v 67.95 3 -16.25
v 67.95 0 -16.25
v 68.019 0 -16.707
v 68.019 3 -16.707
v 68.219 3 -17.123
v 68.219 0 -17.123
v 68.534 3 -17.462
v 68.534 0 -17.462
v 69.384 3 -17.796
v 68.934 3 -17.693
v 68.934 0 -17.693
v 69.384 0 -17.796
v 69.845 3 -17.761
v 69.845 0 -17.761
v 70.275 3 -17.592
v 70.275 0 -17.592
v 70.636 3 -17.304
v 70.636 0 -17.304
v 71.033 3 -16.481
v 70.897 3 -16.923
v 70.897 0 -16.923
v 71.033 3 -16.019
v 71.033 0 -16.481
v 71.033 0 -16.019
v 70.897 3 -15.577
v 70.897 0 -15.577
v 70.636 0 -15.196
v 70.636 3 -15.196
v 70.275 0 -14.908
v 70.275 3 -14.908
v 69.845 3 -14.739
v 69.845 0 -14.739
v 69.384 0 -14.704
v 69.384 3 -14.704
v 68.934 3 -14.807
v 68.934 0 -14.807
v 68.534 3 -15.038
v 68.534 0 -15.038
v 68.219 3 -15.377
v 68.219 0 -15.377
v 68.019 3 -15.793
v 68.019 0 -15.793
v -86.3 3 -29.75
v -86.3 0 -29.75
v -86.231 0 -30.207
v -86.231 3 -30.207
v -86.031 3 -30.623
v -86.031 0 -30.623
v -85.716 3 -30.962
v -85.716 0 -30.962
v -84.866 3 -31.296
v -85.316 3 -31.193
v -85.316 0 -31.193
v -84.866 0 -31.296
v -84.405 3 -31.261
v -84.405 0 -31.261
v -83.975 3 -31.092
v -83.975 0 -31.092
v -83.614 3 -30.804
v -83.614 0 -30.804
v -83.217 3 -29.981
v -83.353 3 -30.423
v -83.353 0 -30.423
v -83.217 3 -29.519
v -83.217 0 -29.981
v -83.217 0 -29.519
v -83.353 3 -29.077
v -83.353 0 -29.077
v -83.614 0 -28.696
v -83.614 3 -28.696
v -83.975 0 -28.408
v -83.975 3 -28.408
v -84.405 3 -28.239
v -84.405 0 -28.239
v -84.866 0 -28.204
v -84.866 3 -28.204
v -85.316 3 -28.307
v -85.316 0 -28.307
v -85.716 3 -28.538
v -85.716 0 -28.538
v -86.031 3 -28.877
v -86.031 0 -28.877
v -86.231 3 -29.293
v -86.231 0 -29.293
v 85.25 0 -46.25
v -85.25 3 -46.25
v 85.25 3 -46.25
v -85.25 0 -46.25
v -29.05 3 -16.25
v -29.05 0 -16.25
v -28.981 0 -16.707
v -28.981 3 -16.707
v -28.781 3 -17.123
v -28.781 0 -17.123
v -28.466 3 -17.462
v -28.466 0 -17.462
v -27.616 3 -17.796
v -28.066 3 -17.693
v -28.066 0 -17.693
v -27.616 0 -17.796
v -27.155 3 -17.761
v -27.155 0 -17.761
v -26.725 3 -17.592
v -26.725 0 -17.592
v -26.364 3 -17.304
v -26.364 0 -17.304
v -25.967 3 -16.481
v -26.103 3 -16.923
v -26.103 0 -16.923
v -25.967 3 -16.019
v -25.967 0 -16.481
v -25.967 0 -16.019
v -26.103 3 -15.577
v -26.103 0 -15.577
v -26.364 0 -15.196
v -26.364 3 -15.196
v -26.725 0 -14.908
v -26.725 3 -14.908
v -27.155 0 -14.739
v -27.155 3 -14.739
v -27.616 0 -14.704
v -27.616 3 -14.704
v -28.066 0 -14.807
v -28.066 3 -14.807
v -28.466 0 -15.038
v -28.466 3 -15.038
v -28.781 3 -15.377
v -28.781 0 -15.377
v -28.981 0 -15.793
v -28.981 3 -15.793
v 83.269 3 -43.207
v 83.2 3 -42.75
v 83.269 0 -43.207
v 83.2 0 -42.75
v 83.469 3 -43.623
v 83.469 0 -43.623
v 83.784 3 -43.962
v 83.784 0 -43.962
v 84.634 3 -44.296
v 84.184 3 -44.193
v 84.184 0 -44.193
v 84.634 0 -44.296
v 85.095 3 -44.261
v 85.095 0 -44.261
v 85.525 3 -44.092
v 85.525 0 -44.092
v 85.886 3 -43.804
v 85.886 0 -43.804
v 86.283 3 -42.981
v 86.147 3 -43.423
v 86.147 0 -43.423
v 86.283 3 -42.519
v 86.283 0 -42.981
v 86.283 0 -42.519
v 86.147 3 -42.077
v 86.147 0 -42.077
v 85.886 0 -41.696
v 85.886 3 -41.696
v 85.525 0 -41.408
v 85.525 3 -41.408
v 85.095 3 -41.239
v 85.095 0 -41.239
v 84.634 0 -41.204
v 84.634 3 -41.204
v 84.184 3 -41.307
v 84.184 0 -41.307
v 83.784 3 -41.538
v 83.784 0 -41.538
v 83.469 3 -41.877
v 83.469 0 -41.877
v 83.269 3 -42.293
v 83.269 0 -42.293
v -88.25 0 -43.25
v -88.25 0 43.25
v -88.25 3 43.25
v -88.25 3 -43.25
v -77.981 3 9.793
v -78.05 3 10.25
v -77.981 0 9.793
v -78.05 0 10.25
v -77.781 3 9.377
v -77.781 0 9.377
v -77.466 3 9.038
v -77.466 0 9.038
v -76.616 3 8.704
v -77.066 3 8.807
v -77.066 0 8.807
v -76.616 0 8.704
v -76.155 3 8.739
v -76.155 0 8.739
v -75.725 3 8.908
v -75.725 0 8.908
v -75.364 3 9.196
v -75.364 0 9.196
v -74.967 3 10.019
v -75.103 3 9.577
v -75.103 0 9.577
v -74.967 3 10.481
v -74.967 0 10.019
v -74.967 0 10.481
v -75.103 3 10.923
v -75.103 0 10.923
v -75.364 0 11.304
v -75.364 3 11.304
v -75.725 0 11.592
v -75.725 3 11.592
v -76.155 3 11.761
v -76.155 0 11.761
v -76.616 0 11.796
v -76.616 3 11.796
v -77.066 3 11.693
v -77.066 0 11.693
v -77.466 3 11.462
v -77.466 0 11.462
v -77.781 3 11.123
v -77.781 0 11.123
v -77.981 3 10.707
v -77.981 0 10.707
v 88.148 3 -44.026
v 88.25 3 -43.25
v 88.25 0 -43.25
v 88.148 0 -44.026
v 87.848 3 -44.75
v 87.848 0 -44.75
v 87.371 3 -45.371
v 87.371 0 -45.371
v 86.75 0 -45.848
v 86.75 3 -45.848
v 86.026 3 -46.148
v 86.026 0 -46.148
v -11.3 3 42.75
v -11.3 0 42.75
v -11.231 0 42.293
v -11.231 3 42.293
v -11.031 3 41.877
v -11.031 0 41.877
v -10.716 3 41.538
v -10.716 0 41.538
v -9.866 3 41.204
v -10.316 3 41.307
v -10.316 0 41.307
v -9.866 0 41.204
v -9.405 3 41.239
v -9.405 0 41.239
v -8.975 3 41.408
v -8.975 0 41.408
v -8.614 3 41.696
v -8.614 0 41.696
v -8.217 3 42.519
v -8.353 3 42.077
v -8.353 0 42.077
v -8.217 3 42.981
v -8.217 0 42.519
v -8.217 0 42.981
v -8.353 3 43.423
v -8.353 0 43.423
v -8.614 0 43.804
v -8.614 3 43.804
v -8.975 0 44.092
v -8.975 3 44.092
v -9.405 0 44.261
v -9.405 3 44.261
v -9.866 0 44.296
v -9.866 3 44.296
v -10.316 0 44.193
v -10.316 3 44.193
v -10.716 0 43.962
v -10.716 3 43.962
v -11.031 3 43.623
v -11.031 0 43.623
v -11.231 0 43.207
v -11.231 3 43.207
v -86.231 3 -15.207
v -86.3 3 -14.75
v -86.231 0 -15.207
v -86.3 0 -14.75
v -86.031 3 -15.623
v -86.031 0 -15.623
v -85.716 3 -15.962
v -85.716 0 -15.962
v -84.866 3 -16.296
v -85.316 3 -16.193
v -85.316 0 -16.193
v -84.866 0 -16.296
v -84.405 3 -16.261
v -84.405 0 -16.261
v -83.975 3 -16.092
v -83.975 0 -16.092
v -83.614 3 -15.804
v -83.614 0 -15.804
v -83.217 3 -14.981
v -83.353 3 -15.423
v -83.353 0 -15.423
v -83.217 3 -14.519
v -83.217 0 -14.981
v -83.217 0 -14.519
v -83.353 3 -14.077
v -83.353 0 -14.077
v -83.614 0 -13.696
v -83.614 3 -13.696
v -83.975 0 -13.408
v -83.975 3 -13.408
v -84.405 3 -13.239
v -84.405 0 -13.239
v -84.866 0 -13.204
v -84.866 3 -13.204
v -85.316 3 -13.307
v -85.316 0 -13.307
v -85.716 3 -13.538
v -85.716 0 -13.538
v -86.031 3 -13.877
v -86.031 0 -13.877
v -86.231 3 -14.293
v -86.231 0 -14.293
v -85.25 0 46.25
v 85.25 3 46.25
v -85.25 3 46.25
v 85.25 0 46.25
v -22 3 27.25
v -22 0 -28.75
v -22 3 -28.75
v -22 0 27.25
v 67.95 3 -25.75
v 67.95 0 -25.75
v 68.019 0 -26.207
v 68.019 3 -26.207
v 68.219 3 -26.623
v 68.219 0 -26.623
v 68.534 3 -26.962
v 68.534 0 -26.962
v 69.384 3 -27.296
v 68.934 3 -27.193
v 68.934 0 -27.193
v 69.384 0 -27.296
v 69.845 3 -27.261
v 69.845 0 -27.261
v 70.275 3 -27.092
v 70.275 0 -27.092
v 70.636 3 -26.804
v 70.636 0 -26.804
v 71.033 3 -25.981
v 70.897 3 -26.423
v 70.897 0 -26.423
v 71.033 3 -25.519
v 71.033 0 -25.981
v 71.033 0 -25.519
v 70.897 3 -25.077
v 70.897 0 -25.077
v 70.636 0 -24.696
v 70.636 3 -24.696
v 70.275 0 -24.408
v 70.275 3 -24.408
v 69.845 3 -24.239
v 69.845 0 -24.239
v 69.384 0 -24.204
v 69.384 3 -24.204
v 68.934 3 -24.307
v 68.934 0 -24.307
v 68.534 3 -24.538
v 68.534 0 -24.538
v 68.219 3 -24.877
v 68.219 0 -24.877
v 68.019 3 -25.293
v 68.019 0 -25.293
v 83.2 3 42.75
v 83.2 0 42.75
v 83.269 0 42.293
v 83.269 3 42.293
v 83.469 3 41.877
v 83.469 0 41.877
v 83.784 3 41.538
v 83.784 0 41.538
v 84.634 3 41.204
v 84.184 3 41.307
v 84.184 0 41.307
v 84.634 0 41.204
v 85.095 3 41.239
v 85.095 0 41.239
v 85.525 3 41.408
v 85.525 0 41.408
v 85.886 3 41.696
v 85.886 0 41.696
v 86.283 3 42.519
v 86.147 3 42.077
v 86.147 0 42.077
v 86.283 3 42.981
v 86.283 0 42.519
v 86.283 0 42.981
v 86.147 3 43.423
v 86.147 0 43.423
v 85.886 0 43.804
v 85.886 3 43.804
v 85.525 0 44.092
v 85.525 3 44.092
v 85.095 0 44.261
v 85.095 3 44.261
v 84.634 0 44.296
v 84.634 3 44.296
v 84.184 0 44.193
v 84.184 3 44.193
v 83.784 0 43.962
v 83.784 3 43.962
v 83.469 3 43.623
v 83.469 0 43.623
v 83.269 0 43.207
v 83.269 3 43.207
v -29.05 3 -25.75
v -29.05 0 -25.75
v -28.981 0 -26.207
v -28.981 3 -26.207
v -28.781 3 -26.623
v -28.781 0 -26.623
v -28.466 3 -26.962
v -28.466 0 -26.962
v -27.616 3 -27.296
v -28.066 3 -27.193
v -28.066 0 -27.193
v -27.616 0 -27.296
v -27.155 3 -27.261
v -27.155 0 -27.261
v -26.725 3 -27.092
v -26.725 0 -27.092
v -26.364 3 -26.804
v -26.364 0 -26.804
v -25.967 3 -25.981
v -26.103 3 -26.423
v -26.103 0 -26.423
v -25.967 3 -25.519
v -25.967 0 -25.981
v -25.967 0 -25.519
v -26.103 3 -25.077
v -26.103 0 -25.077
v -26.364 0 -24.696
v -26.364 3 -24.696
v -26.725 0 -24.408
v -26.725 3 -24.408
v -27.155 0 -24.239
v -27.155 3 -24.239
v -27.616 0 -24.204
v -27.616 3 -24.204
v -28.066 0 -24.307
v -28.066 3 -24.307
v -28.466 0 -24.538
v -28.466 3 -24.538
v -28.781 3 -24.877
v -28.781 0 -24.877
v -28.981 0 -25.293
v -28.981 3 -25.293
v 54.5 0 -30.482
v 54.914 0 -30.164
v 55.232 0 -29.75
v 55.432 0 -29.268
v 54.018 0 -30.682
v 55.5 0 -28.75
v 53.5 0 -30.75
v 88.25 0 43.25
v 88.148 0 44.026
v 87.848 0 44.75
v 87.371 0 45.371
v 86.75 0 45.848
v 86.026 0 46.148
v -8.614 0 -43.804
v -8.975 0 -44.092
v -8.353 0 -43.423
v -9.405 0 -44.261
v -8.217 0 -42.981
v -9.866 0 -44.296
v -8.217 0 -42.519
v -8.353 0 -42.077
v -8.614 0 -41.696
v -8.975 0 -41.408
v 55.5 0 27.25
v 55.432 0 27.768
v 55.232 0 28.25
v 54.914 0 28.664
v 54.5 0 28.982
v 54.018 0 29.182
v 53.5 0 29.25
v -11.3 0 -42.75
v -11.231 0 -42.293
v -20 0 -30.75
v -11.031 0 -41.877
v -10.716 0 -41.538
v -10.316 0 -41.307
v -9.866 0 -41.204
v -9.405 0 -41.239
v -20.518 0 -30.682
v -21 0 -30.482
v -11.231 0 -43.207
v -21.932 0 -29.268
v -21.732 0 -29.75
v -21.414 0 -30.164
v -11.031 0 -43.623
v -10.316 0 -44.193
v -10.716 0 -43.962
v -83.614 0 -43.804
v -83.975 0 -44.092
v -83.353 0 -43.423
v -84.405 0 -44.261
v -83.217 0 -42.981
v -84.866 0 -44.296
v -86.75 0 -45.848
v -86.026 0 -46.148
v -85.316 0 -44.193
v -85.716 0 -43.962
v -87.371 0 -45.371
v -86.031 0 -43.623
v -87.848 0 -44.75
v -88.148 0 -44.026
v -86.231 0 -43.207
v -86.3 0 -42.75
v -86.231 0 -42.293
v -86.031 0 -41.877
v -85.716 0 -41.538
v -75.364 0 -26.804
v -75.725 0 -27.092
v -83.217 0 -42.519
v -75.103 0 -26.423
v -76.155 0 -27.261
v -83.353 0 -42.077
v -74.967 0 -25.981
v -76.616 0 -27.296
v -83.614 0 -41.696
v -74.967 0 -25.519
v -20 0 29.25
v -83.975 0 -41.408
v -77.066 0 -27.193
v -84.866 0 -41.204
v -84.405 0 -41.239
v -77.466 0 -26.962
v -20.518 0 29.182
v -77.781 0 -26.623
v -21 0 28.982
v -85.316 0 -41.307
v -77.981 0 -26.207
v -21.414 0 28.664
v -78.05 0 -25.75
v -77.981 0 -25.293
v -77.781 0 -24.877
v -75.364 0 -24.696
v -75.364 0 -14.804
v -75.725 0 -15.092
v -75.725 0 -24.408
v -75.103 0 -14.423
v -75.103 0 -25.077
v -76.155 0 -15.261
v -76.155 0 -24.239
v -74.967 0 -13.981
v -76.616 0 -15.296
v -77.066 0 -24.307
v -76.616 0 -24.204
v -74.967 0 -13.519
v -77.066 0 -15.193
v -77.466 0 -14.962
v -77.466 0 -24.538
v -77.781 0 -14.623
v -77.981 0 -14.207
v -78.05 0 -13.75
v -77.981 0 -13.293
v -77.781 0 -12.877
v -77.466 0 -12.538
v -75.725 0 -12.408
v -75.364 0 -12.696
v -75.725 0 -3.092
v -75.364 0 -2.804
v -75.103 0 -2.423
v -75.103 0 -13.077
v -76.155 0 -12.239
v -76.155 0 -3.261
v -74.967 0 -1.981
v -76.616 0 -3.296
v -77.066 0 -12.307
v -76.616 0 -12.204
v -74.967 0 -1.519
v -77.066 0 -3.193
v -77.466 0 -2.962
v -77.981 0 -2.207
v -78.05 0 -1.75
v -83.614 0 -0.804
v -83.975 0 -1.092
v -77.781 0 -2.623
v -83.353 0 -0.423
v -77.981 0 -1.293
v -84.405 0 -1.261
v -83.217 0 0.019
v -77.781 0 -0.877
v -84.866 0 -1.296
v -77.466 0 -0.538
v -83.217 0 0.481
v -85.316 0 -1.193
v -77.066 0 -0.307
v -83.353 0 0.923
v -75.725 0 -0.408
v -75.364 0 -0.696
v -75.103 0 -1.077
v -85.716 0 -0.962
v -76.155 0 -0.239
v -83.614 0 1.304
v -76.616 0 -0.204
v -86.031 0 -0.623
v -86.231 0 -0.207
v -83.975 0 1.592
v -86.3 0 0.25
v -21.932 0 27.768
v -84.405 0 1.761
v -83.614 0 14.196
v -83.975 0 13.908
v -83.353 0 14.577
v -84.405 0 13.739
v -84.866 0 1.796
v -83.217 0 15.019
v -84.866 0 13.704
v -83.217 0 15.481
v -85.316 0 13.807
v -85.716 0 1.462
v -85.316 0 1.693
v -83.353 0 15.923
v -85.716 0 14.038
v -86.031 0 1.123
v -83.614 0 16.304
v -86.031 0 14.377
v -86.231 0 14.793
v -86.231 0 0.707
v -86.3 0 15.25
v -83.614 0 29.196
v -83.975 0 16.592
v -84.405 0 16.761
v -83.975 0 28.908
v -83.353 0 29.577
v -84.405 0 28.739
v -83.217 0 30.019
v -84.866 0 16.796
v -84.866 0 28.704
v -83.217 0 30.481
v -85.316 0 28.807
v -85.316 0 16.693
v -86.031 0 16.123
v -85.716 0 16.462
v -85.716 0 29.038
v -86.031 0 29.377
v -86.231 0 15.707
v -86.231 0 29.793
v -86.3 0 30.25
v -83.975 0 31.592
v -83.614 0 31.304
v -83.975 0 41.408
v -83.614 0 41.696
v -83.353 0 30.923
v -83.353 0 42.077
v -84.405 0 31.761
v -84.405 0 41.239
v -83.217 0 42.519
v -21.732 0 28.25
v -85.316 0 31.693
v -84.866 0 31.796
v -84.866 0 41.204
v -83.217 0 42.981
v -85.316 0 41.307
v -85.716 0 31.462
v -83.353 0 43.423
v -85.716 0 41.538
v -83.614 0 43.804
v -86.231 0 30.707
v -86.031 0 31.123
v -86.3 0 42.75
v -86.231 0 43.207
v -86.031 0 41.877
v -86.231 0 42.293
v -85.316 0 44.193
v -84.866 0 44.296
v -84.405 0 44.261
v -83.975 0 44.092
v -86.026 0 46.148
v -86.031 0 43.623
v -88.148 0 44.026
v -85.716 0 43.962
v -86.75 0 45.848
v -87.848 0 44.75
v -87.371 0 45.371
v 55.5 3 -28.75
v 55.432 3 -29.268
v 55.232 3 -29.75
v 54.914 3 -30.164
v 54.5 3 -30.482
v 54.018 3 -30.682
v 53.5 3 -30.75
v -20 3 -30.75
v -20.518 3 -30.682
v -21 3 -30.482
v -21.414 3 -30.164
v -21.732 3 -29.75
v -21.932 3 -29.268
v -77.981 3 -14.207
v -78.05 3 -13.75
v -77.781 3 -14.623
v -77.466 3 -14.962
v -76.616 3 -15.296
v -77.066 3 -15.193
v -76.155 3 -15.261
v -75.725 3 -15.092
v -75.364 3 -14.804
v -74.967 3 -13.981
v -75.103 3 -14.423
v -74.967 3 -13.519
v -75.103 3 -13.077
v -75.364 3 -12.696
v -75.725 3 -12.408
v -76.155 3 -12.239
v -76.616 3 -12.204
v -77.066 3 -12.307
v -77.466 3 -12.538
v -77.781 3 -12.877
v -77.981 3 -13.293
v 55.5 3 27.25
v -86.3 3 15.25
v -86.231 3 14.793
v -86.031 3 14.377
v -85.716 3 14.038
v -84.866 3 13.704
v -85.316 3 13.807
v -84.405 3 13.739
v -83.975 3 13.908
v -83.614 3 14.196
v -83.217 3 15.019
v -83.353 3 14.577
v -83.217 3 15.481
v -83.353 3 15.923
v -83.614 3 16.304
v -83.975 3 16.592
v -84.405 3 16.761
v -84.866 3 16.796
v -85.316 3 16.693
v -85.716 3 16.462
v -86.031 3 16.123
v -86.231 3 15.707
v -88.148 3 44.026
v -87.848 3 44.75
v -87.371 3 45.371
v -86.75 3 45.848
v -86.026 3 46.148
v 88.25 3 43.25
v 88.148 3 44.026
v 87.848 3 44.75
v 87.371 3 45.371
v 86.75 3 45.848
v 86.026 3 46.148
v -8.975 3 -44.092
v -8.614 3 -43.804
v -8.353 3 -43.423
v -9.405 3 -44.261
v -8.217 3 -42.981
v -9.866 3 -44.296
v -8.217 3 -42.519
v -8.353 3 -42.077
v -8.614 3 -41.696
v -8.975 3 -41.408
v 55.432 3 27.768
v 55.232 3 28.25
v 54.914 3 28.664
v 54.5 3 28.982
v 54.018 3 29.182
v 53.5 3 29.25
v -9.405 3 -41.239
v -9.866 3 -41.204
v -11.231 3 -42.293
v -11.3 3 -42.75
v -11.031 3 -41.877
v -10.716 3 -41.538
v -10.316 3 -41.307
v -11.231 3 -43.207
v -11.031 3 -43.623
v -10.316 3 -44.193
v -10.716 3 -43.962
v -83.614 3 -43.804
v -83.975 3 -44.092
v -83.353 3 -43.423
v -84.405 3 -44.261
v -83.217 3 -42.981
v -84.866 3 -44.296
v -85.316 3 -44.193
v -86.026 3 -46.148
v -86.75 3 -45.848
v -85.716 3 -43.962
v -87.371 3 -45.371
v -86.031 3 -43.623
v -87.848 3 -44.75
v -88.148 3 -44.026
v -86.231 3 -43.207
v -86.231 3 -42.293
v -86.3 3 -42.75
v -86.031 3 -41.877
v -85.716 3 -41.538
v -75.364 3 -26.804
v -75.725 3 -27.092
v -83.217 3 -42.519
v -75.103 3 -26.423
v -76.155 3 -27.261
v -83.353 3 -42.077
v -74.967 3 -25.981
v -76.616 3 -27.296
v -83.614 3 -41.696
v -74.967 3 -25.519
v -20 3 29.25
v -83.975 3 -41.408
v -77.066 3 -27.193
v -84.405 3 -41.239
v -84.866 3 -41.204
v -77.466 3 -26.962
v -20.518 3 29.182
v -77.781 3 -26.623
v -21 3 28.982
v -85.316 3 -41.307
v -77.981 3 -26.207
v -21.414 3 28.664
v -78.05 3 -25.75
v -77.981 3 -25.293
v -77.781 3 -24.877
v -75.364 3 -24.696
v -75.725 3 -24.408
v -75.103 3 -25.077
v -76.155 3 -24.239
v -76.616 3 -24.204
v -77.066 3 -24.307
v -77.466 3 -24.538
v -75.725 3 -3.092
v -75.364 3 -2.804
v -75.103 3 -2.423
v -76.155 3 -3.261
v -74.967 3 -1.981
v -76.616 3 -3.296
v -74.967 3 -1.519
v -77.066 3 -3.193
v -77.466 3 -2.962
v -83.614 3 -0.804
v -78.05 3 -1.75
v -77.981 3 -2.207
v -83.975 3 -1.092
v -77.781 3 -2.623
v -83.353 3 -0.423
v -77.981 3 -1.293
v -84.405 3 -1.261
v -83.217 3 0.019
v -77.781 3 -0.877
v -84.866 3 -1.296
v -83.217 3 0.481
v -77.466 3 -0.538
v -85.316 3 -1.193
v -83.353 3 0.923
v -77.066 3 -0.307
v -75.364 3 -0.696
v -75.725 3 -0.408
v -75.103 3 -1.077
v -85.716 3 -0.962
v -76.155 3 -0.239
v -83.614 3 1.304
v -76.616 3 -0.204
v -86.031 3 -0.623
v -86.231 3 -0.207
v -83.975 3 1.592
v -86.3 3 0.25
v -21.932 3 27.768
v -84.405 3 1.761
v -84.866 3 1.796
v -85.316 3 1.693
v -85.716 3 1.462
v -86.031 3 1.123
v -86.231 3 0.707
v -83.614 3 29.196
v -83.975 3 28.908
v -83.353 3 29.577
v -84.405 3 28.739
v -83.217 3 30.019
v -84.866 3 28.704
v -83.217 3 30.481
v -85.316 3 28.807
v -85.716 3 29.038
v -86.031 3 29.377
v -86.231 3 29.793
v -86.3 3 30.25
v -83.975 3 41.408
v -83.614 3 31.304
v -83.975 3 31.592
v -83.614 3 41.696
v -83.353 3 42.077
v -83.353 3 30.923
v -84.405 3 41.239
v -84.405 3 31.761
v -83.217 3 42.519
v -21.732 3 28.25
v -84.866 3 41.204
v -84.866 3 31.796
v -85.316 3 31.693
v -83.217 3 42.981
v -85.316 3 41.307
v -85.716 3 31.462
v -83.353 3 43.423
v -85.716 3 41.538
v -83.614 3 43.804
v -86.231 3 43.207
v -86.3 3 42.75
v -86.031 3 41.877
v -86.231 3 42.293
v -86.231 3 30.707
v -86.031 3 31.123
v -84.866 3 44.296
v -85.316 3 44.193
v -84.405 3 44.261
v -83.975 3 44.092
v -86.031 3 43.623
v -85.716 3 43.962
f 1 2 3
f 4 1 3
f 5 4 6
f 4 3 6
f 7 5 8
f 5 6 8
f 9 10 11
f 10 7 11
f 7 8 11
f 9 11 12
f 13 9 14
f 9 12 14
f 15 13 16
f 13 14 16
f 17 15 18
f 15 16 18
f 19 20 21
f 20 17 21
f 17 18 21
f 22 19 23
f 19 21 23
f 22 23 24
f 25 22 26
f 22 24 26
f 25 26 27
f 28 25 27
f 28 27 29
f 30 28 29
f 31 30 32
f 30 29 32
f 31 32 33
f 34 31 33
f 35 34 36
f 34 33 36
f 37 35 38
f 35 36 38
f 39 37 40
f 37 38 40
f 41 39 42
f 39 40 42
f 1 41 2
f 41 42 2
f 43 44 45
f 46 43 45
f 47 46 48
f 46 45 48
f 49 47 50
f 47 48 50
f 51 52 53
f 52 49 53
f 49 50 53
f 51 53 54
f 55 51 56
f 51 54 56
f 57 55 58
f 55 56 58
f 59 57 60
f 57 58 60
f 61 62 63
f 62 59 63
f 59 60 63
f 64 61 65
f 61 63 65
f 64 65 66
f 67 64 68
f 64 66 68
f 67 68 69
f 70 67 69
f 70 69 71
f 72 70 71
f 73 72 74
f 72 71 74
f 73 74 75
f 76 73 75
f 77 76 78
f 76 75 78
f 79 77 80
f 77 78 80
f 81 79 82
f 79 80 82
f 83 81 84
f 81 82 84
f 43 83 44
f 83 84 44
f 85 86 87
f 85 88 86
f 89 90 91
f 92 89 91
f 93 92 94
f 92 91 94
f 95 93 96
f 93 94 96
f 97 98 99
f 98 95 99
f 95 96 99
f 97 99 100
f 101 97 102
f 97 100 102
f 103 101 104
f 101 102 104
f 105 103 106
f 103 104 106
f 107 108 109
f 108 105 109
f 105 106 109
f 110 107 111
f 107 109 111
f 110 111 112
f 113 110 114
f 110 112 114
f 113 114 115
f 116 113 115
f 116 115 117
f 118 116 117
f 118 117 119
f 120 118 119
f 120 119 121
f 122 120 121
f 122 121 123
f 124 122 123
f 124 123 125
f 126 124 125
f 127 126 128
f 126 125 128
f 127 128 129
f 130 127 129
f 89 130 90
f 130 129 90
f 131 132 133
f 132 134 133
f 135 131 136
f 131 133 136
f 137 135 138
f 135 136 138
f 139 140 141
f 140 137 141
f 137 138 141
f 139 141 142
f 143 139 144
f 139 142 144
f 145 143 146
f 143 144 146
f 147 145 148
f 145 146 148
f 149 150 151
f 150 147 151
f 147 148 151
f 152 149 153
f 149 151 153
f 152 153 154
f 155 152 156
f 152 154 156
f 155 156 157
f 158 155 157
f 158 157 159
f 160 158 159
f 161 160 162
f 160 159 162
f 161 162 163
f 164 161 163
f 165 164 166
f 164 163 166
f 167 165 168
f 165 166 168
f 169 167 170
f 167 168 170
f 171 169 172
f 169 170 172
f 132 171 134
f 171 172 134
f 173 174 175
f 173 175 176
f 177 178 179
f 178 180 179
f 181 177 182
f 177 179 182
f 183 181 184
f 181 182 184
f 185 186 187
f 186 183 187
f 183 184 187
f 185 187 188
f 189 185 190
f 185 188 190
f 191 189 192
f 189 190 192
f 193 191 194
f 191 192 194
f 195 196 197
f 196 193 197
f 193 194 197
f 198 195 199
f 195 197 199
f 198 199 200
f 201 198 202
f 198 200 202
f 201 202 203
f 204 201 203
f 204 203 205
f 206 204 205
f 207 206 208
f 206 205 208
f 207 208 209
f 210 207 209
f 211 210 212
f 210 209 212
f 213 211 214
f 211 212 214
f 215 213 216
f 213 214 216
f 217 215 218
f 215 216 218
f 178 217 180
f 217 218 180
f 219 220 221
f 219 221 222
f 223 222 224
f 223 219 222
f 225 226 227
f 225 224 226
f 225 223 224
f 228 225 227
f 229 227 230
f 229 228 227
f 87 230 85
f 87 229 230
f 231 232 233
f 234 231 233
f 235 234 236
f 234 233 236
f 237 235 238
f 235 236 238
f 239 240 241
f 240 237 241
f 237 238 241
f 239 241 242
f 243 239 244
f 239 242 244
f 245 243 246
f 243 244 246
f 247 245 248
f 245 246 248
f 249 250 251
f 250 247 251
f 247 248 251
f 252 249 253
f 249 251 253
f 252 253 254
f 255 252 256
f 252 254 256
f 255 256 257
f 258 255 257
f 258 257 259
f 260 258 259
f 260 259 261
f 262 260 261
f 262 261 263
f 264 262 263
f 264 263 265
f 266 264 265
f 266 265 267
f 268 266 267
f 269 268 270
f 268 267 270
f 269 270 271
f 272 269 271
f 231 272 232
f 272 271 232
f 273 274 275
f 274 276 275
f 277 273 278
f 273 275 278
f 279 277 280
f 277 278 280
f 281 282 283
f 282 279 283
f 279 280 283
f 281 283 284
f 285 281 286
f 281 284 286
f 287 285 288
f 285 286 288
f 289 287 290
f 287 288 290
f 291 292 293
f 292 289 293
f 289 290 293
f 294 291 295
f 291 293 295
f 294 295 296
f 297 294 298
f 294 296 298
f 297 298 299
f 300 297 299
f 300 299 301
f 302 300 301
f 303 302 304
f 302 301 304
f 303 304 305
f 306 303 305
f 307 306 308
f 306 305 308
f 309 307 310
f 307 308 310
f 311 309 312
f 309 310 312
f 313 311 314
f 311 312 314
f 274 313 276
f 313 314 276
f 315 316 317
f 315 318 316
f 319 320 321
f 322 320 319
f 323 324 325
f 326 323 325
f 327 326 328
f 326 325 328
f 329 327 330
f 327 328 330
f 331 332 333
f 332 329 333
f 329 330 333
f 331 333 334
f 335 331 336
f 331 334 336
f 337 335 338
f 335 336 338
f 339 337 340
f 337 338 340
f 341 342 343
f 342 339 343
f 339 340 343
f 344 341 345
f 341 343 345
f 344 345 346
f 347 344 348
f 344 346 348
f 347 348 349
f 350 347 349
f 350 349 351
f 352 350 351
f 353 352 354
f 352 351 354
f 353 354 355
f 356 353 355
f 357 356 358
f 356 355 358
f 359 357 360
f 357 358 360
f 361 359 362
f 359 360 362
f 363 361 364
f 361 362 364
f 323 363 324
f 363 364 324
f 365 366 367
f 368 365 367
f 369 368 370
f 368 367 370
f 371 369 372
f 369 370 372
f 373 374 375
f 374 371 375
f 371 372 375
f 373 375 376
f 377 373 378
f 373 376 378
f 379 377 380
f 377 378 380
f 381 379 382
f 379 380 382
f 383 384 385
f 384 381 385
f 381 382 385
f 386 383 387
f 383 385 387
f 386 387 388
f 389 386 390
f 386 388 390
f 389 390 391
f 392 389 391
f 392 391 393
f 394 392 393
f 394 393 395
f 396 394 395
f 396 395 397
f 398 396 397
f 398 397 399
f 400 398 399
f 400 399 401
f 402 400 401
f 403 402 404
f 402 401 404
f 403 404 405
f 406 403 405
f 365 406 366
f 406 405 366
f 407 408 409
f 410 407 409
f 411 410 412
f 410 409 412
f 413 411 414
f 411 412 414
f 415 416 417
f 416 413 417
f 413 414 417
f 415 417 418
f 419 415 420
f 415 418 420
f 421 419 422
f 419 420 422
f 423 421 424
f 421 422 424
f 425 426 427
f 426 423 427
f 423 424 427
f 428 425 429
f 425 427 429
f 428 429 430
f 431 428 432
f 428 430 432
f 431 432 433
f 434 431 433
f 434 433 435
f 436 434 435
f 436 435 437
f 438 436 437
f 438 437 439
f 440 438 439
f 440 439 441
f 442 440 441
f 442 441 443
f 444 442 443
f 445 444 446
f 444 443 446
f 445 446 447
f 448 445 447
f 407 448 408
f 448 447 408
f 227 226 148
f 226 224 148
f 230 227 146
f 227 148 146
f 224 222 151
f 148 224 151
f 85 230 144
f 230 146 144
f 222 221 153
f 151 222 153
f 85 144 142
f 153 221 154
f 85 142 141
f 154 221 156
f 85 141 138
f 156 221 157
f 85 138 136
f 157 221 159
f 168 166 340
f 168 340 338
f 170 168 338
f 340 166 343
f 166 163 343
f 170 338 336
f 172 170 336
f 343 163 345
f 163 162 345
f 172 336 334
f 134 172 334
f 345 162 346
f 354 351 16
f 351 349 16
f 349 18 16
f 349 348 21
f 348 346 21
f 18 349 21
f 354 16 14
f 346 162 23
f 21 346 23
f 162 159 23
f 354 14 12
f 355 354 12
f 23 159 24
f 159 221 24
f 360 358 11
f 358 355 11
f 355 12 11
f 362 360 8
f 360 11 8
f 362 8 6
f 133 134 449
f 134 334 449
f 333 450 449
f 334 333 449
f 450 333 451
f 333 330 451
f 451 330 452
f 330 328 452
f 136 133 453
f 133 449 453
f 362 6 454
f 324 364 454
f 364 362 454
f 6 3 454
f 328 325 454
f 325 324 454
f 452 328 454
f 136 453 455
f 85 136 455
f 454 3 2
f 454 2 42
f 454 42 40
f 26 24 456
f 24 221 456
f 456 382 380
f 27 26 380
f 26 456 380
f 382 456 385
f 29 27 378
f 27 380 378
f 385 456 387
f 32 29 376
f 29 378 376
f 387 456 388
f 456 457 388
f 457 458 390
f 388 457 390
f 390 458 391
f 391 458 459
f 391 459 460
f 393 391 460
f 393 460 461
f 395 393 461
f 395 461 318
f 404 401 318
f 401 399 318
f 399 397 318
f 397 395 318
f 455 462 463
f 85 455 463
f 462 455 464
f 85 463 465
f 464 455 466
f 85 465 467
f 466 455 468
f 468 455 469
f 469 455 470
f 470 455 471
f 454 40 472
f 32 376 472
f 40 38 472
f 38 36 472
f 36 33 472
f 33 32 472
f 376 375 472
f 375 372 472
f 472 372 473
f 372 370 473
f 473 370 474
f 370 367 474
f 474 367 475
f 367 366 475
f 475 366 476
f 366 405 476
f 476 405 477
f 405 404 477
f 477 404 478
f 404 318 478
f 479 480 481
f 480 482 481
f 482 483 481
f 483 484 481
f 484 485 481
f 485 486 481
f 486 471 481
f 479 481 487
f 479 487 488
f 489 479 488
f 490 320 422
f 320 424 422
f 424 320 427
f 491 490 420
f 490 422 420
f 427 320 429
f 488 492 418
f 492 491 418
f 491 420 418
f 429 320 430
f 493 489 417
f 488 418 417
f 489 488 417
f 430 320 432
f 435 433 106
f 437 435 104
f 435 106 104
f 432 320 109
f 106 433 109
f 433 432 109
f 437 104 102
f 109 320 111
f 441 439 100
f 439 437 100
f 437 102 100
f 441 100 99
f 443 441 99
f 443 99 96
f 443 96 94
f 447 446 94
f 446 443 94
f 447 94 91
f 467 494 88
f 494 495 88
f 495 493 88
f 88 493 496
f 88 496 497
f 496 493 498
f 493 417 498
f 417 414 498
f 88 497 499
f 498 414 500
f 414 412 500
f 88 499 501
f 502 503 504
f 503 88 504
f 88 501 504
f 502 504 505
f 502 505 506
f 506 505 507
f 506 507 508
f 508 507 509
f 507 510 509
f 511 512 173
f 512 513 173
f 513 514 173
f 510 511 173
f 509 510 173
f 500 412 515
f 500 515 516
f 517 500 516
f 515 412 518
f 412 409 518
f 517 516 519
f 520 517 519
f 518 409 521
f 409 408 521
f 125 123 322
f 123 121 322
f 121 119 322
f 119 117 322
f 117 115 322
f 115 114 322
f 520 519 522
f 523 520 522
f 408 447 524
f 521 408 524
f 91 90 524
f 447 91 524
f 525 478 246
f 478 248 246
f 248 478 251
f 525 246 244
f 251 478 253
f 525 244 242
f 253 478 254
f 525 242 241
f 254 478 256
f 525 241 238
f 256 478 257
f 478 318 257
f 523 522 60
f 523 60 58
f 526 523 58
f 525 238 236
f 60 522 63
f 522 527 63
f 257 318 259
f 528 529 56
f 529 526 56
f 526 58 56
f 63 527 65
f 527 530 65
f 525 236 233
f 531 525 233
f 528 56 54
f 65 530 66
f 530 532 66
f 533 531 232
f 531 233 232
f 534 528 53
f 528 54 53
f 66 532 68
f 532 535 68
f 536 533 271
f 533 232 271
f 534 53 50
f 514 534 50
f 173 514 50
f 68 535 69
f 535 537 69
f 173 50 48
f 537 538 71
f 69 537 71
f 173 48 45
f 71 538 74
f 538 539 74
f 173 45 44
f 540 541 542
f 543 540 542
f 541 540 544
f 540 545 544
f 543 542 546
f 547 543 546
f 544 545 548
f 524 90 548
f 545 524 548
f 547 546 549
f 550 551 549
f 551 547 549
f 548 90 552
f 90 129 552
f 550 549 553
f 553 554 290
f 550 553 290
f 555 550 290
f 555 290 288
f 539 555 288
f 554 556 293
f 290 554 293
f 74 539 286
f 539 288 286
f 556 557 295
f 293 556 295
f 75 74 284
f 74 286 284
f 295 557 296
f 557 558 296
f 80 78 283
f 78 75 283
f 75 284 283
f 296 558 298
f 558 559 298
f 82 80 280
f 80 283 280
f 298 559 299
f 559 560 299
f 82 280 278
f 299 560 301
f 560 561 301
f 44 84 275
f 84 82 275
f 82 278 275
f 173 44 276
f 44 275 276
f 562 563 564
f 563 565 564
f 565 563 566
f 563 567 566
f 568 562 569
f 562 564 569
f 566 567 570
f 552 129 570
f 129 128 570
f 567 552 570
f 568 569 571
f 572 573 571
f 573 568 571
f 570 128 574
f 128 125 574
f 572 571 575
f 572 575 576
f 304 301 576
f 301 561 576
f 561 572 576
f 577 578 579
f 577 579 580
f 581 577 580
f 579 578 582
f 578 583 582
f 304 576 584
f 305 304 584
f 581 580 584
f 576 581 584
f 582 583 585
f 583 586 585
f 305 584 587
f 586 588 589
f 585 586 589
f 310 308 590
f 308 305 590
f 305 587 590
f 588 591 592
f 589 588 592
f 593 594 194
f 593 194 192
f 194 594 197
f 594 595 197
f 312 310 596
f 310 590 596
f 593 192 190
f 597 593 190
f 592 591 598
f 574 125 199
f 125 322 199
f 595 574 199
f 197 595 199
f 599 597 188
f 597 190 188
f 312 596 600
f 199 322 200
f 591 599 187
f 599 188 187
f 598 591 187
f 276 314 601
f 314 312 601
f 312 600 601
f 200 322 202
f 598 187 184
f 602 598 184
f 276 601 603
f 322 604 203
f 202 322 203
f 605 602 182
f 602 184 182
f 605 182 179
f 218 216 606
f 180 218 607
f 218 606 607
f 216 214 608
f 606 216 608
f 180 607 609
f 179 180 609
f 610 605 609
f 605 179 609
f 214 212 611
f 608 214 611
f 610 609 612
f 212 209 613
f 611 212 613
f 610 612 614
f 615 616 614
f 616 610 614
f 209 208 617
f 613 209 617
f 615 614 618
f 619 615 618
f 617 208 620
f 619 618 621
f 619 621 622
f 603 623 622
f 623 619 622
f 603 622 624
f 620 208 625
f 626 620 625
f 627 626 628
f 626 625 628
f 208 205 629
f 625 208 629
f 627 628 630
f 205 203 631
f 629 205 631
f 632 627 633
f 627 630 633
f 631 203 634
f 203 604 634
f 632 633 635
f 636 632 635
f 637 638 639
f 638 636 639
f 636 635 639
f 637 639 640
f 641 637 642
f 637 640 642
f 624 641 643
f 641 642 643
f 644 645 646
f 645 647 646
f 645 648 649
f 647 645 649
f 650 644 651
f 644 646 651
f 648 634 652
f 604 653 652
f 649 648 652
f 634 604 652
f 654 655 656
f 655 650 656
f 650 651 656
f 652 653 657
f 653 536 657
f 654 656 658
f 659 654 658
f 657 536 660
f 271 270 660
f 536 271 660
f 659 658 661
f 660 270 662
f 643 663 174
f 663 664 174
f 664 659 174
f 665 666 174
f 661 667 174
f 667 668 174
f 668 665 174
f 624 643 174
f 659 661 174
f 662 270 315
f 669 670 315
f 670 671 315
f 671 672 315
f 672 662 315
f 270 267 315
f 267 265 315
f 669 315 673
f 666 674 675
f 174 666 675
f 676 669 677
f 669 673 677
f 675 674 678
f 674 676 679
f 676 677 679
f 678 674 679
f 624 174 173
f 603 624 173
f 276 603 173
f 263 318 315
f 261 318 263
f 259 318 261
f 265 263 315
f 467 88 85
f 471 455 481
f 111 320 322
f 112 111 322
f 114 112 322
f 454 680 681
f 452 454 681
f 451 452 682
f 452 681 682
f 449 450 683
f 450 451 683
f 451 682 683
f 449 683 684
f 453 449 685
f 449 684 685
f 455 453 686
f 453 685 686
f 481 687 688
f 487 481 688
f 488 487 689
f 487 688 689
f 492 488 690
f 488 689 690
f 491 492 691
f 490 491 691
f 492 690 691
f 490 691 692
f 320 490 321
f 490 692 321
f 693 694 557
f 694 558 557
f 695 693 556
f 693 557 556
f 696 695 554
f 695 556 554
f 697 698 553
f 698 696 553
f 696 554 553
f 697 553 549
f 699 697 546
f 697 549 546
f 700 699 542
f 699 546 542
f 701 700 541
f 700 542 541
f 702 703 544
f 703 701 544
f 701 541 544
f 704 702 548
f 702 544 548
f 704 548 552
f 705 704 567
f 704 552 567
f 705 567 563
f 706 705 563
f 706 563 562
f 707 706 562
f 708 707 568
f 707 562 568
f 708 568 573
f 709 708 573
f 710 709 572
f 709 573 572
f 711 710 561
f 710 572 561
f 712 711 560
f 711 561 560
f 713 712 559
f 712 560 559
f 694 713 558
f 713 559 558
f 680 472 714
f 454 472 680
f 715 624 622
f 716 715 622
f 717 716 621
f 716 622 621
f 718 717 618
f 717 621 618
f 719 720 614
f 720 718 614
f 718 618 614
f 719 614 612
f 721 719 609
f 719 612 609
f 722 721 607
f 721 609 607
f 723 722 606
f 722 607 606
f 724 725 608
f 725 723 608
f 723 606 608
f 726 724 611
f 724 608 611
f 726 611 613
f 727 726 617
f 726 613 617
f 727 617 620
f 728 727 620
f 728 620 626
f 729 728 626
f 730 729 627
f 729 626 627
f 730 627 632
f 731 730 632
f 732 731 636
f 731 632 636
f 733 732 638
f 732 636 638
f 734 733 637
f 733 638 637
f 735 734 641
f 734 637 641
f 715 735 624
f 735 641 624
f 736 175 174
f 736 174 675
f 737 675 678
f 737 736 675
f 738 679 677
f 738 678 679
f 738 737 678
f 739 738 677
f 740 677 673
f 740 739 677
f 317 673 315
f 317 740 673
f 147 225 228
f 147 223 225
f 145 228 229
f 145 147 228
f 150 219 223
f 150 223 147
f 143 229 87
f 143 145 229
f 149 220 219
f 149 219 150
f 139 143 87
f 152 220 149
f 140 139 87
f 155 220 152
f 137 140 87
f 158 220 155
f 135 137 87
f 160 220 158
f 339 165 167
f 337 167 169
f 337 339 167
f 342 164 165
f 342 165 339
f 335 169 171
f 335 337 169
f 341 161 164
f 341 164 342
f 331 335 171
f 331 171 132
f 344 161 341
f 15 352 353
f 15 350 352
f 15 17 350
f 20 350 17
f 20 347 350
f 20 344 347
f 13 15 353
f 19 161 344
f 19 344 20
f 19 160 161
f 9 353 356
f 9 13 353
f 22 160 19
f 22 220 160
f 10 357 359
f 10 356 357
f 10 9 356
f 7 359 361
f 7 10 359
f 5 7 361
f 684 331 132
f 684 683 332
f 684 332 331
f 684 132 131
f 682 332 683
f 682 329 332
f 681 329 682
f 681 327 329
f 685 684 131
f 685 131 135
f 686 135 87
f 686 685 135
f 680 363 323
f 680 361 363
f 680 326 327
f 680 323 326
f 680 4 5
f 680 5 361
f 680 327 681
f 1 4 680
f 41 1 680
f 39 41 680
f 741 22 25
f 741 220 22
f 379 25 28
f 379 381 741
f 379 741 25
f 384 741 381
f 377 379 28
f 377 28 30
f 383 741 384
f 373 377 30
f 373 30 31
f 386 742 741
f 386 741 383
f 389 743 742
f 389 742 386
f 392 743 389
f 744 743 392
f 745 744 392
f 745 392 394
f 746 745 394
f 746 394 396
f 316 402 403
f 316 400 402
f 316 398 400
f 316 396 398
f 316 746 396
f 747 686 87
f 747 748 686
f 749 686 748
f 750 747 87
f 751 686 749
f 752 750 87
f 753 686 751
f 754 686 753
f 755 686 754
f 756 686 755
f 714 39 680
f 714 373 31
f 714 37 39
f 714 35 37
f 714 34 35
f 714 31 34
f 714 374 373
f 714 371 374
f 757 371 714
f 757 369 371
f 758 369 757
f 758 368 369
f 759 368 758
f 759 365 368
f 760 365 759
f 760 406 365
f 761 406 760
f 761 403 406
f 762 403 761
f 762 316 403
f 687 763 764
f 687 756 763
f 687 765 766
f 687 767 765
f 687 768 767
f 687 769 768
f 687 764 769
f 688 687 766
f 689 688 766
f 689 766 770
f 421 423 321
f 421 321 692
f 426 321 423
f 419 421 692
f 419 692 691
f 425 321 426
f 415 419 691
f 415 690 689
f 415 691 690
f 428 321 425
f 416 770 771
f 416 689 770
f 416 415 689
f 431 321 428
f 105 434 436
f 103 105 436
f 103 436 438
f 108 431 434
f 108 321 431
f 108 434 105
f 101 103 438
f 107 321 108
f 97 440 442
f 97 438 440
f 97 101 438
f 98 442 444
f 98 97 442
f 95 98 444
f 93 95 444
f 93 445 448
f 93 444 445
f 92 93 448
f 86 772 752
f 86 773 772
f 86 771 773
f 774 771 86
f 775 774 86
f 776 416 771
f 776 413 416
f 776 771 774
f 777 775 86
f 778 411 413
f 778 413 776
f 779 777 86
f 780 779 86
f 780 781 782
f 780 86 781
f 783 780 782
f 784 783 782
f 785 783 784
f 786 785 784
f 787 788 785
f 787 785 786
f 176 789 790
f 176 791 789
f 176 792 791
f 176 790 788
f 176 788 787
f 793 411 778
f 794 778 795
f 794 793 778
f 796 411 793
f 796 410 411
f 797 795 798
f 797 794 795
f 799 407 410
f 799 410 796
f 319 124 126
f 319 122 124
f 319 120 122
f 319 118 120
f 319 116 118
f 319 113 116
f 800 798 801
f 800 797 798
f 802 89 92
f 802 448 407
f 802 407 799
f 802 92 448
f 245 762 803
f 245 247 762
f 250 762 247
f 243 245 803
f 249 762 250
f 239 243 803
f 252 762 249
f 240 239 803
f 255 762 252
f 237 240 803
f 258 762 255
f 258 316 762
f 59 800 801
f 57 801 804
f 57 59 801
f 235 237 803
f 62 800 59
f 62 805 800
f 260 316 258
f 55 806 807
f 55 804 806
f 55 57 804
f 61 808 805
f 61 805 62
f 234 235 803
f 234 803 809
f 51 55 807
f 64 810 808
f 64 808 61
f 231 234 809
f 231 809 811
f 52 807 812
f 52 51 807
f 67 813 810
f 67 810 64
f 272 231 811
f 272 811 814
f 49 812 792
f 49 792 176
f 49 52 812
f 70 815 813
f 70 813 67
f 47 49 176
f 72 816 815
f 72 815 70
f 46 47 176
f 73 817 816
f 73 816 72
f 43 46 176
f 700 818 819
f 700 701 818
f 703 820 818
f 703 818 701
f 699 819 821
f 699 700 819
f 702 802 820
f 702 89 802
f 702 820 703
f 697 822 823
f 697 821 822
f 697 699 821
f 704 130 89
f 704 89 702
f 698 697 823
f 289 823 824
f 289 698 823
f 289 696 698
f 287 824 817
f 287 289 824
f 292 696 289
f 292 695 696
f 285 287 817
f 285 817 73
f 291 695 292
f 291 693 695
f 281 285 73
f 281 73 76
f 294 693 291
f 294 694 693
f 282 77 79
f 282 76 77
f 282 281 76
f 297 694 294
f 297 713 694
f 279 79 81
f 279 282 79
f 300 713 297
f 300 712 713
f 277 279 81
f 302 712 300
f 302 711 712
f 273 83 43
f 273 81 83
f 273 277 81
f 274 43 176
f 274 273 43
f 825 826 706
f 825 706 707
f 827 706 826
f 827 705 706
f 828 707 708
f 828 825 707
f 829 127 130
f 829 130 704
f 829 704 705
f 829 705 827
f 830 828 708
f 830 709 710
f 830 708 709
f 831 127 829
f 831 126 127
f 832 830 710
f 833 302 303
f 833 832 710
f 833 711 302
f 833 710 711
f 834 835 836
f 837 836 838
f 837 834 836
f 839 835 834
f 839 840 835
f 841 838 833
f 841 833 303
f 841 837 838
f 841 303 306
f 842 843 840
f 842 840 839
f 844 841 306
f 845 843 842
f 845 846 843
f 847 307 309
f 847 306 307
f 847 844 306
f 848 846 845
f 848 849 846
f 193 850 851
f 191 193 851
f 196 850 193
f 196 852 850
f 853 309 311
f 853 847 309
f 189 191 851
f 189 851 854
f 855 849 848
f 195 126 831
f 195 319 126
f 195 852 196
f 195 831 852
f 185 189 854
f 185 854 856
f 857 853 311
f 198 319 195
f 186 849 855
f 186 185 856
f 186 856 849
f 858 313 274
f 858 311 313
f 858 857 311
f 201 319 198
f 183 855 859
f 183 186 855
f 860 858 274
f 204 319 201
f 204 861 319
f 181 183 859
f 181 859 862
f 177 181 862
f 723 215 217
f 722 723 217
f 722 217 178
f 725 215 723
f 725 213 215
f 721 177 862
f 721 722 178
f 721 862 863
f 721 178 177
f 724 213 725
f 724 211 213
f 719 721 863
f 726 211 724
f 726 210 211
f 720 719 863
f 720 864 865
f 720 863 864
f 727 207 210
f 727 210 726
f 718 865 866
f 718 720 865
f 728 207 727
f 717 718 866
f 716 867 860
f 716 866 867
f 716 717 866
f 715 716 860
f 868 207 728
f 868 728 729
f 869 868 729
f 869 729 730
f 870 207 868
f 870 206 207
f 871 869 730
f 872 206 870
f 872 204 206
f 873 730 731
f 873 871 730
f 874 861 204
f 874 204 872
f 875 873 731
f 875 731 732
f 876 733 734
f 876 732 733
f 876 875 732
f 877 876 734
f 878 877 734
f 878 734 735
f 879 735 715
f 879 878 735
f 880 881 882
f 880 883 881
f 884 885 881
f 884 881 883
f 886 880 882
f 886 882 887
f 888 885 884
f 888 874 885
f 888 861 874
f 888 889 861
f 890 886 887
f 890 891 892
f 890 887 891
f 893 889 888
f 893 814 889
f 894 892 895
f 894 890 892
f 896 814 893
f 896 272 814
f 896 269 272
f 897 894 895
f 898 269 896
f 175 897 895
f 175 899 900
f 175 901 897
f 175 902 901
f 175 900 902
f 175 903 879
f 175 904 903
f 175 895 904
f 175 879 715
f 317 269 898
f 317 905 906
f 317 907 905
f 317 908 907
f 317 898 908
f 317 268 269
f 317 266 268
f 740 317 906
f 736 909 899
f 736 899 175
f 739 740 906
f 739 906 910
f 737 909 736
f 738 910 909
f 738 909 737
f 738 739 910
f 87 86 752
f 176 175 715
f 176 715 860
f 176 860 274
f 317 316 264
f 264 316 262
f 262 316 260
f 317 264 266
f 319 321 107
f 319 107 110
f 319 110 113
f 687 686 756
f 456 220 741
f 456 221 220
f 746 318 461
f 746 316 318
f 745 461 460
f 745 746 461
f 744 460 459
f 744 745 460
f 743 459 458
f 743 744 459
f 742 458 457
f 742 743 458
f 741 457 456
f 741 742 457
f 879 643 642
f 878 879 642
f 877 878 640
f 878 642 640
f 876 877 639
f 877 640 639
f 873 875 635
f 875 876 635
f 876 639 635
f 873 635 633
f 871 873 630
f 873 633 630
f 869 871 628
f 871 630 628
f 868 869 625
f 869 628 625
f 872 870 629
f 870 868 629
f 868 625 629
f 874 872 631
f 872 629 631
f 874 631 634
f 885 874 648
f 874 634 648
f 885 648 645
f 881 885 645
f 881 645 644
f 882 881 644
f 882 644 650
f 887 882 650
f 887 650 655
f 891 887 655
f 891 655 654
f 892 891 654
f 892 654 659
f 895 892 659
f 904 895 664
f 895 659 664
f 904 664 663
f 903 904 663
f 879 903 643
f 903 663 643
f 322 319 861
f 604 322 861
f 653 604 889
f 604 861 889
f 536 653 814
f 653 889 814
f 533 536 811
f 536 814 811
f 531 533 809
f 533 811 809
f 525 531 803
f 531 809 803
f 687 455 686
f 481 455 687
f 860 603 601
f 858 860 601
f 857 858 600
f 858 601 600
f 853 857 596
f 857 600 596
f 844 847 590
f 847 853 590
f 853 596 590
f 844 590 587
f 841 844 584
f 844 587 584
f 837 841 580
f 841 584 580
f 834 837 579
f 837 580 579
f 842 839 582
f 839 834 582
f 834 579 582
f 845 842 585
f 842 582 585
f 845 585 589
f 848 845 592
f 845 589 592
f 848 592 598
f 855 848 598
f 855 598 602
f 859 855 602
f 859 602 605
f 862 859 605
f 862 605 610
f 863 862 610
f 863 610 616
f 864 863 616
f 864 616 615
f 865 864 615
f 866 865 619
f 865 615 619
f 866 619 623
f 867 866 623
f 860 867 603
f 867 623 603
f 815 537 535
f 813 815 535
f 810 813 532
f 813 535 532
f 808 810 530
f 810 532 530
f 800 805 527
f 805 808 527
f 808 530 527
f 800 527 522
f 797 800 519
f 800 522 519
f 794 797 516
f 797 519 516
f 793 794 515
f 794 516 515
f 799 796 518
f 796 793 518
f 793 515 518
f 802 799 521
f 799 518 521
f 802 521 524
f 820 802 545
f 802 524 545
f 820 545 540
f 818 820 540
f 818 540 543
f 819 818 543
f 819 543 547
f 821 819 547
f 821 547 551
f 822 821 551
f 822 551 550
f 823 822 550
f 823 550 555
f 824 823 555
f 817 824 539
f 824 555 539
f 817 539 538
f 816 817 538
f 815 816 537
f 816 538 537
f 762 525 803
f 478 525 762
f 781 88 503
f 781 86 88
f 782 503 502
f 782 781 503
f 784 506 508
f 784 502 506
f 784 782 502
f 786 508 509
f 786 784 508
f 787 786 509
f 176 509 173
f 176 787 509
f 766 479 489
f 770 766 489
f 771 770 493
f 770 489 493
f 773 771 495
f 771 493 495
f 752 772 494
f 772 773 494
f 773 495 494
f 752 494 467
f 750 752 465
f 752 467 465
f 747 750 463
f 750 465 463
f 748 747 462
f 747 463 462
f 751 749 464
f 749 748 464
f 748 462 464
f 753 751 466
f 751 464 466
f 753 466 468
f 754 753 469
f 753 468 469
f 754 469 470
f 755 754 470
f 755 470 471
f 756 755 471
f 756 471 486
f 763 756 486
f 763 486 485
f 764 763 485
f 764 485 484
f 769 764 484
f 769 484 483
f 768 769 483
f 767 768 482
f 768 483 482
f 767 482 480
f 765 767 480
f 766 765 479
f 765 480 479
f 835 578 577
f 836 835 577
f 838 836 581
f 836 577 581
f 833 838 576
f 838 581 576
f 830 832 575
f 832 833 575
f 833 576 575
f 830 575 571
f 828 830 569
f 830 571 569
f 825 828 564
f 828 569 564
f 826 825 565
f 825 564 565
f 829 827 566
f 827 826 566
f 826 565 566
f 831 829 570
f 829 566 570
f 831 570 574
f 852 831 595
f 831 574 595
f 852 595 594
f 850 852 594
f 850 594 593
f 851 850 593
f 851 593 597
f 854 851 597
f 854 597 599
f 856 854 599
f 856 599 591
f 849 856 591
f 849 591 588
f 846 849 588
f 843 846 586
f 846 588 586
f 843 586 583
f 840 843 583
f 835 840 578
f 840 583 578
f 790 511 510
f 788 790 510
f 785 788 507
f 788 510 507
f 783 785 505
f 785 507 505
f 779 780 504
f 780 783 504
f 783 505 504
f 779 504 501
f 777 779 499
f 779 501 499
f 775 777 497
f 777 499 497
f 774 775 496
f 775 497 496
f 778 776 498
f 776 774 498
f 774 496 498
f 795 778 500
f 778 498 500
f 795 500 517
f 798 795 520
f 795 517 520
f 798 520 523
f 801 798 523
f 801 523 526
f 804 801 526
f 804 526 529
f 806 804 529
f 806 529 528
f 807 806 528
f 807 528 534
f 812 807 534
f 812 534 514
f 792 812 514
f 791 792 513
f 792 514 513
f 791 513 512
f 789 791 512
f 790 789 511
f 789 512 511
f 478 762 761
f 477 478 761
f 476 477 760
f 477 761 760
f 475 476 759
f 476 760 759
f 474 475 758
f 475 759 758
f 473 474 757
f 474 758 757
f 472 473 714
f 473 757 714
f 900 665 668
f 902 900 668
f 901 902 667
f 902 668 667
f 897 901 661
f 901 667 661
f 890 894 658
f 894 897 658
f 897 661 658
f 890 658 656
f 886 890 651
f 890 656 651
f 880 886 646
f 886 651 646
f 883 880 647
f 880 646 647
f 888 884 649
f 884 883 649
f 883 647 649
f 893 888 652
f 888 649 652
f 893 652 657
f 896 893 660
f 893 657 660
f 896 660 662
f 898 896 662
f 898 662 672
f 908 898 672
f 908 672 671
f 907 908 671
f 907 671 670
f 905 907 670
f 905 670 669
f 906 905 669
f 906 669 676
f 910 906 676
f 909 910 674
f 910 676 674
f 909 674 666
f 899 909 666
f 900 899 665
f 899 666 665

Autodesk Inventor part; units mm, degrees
ref_plane "YZ Plane" through (0, 0, 0) normal (1, 0, 0) x (0, 1, 0)
ref_plane "XZ Plane" through (0, 0, 0) normal (0, 1, 0) x (-1, 0, 0)
ref_plane "XY Plane" through (0, 0, 0) normal (0, 0, 1) x (1, 0, 0)
sketch "スケッチ1" plane through (0, 0, 0) normal (0, 1, 0) x (-1, 0, 0)
  line L0 (-88.25, 46.25) -> (88.25, 46.25)
  line L1 (88.25, 46.25) -> (88.25, -46.25)
  line L2 (88.25, -46.25) -> (-88.25, -46.25)
  line L3 (-88.25, -46.25) -> (-88.25, 46.25)
  line L4 (-88.25, 46.25) -> (88.25, -46.25) construction
  line L5 (88.25, 46.25) -> (-88.25, -46.25) construction
  circle A0 centre (84.75, 42.75) radius 1.55
  circle A1 centre (9.75, 42.75) radius 1.55
  circle A2 centre (-84.75, 42.75) radius 1.55
  line L6 (151.0272, 0) -> (-157.6431, 0) construction
  line L7 (0, 129.3763) -> (0, -94.6315) construction
  circle A3 centre (84.75, -42.75) radius 1.55
  circle A4 centre (9.75, -42.75) radius 1.55
  circle A5 centre (-84.75, -42.75) radius 1.55
  circle A6 centre (27.5, -25.75) radius 1.55
  circle A7 centre (27.5, -16.25) radius 1.55
  line L8 (88.25, -25.75) -> (-88.25, -25.75) construction
  line L9 (-88.25, -16.25) -> (88.25, -16.25) construction
  circle A8 centre (-69.5, -25.75) radius 1.55
  circle A9 centre (-69.5, -16.25) radius 1.55
  circle A10 centre (84.75, -29.75) radius 1.55
  circle A11 centre (84.75, -14.75) radius 1.55
  circle A12 centre (84.75, 0.25) radius 1.55
  circle A13 centre (84.75, 15.25) radius 1.55
  circle A14 centre (84.75, 30.25) radius 1.55
  circle A15 centre (76.5, -25.75) radius 1.55
  circle A16 centre (76.5, -13.75) radius 1.55
  circle A17 centre (76.5, -1.75) radius 1.55
  circle A18 centre (76.5, 10.25) radius 1.55
  line L10 (-55.5, -30.75) -> (22, -30.75)
  line L11 (22, -30.75) -> (22, 29.25)
  line L12 (22, 29.25) -> (-55.5, 29.25)
  line L13 (-55.5, 29.25) -> (-55.5, -30.75)
  line L14 (-55.5, -30.75) -> (22, 29.25) construction
  line L15 (22, -30.75) -> (-55.5, 29.25) construction
  point P0 (0, 0)
  point P1 (-16.75, -0.75)
  dimension "d105" = 176.5
  dimension "d106" = 92.5
  dimension "d107" = 3.5
  dimension "d108" = 3.5
  dimension "d109" = 3.1
  dimension "d110" = 78.5
  dimension "d111" = 3.5
  dimension "d112" = 3.1
  dimension "d113" = 173
  dimension "d114" = 3.5
  dimension "d115" = 3.1
  dimension "d116" = 46.25
  dimension "d117" = 88.25
  dimension "d118" = 60.75
  dimension "d119" = 20.5
  dimension "d120" = 30
  dimension "d121" = 3.1
  dimension "d122" = 3.1
  dimension "d123" = 60.75
  dimension "d129" = 3.1
  dimension "d130" = 3.1
  dimension "d132" = 9.5
  dimension "d133" = 20.5
  dimension "d134" = 30
  dimension "d136" = 16.5
  dimension "d137" = 3.5
  dimension "d138" = 3.1
  dimension "d141" = 15
  dimension "d146" = 20.5
  dimension "d147" = 11.75
  dimension "d148" = 3.1
  dimension "d151" = 12
  dimension "d156" = 15.5
  dimension "d157" = 75.5
  dimension "d158" = 66.25
  dimension "d159" = 143.75
  dimension "d164" = 97
  dimension "d165" = 157.75
extrude "押し出し1" add sketch "スケッチ1" along normal blind 3
fillet "フィレット1" radius 2 4 edges at (-22, 1.5, 29.25) (-22, 1.5, -30.75) (55.5, 1.5, 29.25) (55.5, 1.5, -30.75)
fillet "フィレット2" radius 3 4 edges at (-88.25, 1.5, 46.25) (-88.25, 1.5, -46.25) (88.25, 1.5, 46.25) (88.25, 1.5, -46.25)
equation "\"d108\" = d107"
equation "\"d111\" = d107"
equation "\"d112\" = d109"
equation "\"d114\" = d111"
equation "\"d115\" = d112"
equation "\"d121\" = d109"
equation "\"d122\" = d109"
equation "\"d123\" = d118"
equation "\"d129\" = d131"
equation "\"d130\" = d131"
equation "\"d138\" = d109"
equation "\"d148\" = d138"
equation "\"d131\" = 3.1"
properties part number "Sole_frame" material "GFRC"
